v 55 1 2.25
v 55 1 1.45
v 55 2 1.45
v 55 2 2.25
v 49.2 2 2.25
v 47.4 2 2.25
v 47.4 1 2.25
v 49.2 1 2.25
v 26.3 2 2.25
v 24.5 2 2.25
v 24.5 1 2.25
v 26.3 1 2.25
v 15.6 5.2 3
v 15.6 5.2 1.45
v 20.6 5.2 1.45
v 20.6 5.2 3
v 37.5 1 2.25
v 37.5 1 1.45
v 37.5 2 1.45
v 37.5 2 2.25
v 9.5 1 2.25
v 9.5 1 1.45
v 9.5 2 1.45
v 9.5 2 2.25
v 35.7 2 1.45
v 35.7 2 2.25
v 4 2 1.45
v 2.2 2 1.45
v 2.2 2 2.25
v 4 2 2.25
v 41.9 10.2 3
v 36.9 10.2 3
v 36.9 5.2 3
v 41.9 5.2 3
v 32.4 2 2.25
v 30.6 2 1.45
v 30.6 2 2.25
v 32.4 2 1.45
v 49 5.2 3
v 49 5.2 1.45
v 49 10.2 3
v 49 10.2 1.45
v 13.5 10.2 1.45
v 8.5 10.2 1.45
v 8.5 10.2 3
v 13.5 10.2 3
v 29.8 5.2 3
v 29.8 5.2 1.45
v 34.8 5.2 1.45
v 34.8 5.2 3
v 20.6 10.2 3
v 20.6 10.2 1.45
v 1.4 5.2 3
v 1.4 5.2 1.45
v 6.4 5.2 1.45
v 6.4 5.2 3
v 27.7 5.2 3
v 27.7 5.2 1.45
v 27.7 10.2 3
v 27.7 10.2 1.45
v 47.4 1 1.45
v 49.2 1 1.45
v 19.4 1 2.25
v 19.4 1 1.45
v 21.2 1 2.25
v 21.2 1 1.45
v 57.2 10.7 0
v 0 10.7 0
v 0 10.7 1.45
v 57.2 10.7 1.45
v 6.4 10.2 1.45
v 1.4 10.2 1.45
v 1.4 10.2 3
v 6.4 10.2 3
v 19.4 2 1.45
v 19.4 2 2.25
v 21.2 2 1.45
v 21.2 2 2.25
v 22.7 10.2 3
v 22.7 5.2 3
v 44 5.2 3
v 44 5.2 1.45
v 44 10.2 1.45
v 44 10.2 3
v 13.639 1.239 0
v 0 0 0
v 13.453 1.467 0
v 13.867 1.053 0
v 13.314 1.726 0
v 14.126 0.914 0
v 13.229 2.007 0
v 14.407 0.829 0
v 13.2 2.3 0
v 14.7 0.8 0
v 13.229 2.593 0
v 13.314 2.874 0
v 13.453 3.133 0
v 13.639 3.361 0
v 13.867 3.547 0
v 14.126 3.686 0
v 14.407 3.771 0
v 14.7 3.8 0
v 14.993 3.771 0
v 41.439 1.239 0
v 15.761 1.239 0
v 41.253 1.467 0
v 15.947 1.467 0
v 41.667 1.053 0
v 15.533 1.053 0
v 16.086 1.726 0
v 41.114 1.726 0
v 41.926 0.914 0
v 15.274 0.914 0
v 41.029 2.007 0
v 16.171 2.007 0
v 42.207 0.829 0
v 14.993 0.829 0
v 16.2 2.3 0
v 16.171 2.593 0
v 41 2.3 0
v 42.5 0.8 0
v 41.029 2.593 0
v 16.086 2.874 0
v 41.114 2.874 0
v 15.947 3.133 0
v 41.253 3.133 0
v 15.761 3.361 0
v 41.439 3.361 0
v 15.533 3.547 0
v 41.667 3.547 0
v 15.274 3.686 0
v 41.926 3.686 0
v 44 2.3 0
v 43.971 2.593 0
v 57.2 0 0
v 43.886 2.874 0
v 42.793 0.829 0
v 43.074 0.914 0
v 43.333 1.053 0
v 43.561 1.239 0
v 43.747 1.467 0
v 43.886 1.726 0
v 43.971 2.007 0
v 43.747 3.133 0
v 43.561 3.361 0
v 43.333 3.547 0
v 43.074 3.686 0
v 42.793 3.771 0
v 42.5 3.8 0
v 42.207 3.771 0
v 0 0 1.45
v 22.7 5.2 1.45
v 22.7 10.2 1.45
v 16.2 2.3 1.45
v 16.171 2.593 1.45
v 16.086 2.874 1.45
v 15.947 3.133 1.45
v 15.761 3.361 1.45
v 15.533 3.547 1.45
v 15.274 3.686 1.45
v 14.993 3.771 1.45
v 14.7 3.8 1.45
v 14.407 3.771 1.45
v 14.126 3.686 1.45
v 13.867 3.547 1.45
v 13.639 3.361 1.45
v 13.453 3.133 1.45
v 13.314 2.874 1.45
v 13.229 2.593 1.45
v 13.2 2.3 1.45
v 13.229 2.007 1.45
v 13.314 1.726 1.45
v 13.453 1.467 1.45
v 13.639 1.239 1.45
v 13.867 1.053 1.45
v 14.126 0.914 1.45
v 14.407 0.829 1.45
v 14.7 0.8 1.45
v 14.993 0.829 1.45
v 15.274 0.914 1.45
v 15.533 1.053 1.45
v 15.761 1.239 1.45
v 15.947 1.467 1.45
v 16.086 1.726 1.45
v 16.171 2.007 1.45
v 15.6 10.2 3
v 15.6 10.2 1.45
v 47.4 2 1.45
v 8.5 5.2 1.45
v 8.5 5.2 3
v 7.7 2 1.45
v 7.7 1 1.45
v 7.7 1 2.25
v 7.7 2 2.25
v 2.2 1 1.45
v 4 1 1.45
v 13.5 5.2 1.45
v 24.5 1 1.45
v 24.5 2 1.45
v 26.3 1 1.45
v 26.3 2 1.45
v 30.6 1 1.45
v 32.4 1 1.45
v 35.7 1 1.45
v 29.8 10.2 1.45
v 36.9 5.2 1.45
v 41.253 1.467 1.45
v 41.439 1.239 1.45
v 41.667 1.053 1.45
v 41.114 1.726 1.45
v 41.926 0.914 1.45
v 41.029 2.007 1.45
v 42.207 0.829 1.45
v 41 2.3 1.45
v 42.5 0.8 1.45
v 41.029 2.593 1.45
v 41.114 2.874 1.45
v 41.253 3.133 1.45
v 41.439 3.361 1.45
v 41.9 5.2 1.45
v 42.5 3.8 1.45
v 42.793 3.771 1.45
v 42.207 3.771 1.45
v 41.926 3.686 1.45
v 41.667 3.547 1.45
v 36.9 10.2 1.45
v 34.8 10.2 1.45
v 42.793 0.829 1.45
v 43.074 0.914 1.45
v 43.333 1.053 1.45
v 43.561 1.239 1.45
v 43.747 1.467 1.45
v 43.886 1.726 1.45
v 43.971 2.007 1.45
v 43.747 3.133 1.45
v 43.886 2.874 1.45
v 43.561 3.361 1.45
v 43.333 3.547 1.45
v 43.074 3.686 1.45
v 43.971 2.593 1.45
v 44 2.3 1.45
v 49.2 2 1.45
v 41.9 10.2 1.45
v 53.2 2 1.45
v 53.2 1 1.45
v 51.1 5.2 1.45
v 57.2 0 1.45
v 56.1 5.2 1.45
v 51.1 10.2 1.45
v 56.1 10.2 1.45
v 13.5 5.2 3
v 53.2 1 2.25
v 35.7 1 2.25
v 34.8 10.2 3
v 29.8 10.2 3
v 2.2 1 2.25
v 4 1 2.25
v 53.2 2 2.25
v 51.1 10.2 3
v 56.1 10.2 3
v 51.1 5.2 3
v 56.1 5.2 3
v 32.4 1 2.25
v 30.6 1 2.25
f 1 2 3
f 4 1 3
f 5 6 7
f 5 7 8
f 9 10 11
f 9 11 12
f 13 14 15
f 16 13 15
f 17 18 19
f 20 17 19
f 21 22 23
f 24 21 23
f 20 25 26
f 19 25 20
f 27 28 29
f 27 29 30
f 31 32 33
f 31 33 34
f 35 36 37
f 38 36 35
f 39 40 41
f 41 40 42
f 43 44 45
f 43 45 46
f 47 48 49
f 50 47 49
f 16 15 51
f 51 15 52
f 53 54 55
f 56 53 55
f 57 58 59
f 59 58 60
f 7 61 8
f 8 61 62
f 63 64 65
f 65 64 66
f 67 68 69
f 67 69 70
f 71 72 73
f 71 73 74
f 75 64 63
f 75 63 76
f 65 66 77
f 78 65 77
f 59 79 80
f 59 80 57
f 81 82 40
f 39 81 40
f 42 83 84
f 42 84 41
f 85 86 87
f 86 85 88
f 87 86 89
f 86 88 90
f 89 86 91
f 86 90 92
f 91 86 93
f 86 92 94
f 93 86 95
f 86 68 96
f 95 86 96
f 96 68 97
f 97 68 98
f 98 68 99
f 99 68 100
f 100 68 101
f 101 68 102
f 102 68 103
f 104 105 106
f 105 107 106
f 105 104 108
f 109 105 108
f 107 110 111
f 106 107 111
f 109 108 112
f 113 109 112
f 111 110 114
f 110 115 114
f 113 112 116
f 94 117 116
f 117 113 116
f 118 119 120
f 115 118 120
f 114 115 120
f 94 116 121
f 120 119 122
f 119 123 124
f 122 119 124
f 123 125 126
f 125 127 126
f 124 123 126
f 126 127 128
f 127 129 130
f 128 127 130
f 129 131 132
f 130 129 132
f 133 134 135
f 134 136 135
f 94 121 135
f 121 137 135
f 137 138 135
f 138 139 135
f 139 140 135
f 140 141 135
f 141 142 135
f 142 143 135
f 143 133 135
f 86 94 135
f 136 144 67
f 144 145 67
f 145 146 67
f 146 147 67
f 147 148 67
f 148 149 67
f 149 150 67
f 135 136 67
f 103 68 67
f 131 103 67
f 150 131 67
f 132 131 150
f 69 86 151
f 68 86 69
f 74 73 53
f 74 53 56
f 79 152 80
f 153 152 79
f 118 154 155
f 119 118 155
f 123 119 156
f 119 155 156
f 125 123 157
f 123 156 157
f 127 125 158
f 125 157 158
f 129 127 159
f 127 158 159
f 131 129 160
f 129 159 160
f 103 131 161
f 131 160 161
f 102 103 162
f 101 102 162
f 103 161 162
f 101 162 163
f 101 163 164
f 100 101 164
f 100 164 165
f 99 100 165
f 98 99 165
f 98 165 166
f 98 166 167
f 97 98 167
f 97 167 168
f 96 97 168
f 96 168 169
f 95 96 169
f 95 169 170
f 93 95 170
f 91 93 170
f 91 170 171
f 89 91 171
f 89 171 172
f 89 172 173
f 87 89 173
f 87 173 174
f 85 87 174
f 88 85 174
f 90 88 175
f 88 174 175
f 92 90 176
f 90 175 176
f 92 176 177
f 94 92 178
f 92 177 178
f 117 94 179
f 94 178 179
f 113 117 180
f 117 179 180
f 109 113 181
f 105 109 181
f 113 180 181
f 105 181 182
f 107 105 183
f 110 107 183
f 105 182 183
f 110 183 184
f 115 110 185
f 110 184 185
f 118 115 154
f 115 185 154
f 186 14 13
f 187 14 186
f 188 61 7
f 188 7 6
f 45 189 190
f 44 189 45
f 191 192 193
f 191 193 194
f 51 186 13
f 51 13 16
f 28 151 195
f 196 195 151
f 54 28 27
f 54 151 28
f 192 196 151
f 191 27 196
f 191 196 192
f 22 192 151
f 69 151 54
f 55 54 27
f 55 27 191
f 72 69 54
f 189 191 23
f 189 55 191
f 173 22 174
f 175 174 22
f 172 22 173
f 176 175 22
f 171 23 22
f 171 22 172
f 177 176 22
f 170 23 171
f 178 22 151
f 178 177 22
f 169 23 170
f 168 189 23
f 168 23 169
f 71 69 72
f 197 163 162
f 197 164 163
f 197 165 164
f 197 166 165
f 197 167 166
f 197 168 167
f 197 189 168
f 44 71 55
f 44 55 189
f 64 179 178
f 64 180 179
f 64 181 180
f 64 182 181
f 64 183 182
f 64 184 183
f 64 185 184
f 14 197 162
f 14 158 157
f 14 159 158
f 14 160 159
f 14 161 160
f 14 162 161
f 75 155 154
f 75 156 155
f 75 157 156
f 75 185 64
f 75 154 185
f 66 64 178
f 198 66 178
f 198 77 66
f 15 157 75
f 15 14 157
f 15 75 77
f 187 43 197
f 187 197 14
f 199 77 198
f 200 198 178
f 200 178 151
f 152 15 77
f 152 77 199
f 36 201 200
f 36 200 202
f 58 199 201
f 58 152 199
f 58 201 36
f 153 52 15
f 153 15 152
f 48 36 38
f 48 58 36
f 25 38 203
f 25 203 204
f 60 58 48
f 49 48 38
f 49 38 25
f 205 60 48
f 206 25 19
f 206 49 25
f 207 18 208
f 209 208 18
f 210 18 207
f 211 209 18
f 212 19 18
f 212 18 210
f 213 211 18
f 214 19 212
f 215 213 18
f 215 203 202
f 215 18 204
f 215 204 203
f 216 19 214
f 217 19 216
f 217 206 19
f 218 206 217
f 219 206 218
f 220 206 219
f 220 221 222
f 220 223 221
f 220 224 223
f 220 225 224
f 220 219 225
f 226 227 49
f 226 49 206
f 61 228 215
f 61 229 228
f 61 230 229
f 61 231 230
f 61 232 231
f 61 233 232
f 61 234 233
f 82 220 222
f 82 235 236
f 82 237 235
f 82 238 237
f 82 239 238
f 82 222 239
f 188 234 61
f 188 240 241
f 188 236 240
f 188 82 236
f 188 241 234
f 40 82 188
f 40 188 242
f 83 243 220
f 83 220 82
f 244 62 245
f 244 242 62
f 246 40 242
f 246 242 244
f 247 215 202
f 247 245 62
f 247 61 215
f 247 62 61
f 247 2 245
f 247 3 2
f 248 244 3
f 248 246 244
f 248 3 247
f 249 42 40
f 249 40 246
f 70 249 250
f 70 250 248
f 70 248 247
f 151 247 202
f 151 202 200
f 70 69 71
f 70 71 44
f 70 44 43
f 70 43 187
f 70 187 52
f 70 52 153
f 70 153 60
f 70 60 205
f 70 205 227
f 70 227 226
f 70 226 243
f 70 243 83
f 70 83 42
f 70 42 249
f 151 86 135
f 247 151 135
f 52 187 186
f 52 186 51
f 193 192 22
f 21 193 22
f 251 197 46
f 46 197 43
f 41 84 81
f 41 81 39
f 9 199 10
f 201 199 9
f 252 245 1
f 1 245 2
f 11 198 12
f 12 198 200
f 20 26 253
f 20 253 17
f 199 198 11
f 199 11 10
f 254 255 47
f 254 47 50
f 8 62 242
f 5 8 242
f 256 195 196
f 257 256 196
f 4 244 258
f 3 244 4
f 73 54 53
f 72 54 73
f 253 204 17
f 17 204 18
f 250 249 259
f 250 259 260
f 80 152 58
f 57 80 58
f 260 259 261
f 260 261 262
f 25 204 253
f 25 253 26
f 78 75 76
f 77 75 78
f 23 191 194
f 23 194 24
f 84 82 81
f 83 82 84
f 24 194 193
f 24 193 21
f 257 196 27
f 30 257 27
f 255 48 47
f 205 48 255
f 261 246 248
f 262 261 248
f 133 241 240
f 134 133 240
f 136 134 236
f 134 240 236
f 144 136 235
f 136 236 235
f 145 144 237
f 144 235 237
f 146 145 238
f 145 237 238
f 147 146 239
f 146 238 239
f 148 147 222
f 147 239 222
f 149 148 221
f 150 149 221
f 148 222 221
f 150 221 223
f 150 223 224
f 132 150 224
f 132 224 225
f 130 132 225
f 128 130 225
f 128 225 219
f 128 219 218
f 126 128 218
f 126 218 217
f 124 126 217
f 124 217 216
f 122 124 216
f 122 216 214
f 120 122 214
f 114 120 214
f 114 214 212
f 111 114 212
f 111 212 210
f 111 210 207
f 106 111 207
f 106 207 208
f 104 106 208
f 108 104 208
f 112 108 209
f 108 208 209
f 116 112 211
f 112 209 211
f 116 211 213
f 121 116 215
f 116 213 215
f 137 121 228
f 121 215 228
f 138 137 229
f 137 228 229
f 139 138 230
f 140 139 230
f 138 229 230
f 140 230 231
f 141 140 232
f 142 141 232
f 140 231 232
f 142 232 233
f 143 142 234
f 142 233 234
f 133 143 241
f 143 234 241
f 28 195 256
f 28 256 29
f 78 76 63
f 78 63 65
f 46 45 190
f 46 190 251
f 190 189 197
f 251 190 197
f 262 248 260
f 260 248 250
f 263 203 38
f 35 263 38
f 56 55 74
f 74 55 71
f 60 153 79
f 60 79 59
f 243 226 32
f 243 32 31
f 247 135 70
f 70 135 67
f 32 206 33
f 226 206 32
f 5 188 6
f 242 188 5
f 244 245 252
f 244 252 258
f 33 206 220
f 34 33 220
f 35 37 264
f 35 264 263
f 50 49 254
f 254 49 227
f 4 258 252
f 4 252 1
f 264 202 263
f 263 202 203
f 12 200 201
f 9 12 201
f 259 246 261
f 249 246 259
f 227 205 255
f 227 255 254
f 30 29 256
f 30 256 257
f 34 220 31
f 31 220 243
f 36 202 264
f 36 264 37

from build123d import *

# Parameters (mm, degrees)
CROQUIS1_W              = 57.2
CROQUIS1_H              = 10.7
SALIENTE_EXTRUIR1_DEPTH = 1.45
CROQUIS2_W              = 5
CROQUIS2_H              = 5
SALIENTE_EXTRUIR2_DEPTH = 1.55
MATRIZL1_COUNT          = 8
MATRIZL1_PITCH          = 7.1
CORTAR_EXTRUIR1_REACH   = 3.45
CROQUIS3_R              = 1.5
CROQUIS4_W              = 1.8
CROQUIS4_H              = 1
SALIENTE_EXTRUIR3_DEPTH = 0.8


with BuildPart() as part:
    # Croquis1 → Saliente-Extruir1 (new body)
    with BuildSketch(Plane.XY):
        with Locations((28.6, 5.35)):
            Rectangle(CROQUIS1_W, CROQUIS1_H)
    extrude(amount=SALIENTE_EXTRUIR1_DEPTH)

    # Croquis2 → Saliente-Extruir2 (add)
    with BuildSketch(Plane.XY.offset(1.45)):
        with Locations((3.9, 7.7)):
            Rectangle(CROQUIS2_W, CROQUIS2_H)
    saliente_extruir2 = extrude(amount=SALIENTE_EXTRUIR2_DEPTH)

    # MatrizL1: Saliente-Extruir2 ×8
    with Locations(*[(i * MATRIZL1_PITCH, 0, 0) for i in range(1, MATRIZL1_COUNT)]):
        add(saliente_extruir2)

    # Croquis3 → Cortar-Extruir1 (cut, up to next)
    with BuildSketch(Plane.XY.offset(1.45), mode=Mode.PRIVATE) as cortar_extruir1_sk1:
        with Locations((14.7, 2.3)):
            Circle(CROQUIS3_R)
    cortar_extruir1_tool1 = extrude(cortar_extruir1_sk1.sketch, amount=-CORTAR_EXTRUIR1_REACH, mode=Mode.PRIVATE) & part.part
    add(cortar_extruir1_tool1.solids().sort_by_distance((14.7, 2.3, 1.45))[0], mode=Mode.SUBTRACT)
    # Croquis3 → Cortar-Extruir1 (cut, up to next)
    with BuildSketch(Plane.XY.offset(1.45), mode=Mode.PRIVATE) as cortar_extruir1_sk2:
        with Locations((42.5, 2.3)):
            Circle(CROQUIS3_R)
    cortar_extruir1_tool2 = extrude(cortar_extruir1_sk2.sketch, amount=-CORTAR_EXTRUIR1_REACH, mode=Mode.PRIVATE) & part.part
    add(cortar_extruir1_tool2.solids().sort_by_distance((42.5, 2.3, 1.45))[0], mode=Mode.SUBTRACT)

    # Croquis4 → Saliente-Extruir3 (add)
    with BuildSketch(Plane.XY.offset(1.45)):
        with Locations((3.1, 1.5)):
            Rectangle(CROQUIS4_W, CROQUIS4_H)
        with Locations((8.6, 1.5)):
            Rectangle(CROQUIS4_W, CROQUIS4_H)
        with Locations((20.3, 1.5)):
            Rectangle(CROQUIS4_W, CROQUIS4_H)
        with Locations((25.4, 1.5)):
            Rectangle(CROQUIS4_W, CROQUIS4_H)
        with Locations((31.5, 1.5)):
            Rectangle(CROQUIS4_W, CROQUIS4_H)
        with Locations((36.6, 1.5)):
            Rectangle(CROQUIS4_W, CROQUIS4_H)
        with Locations((48.3, 1.5)):
            Rectangle(CROQUIS4_W, CROQUIS4_H)
        with Locations((54.1, 1.5)):
            Rectangle(CROQUIS4_W, CROQUIS4_H)
    extrude(amount=SALIENTE_EXTRUIR3_DEPTH)


solid = part.part
